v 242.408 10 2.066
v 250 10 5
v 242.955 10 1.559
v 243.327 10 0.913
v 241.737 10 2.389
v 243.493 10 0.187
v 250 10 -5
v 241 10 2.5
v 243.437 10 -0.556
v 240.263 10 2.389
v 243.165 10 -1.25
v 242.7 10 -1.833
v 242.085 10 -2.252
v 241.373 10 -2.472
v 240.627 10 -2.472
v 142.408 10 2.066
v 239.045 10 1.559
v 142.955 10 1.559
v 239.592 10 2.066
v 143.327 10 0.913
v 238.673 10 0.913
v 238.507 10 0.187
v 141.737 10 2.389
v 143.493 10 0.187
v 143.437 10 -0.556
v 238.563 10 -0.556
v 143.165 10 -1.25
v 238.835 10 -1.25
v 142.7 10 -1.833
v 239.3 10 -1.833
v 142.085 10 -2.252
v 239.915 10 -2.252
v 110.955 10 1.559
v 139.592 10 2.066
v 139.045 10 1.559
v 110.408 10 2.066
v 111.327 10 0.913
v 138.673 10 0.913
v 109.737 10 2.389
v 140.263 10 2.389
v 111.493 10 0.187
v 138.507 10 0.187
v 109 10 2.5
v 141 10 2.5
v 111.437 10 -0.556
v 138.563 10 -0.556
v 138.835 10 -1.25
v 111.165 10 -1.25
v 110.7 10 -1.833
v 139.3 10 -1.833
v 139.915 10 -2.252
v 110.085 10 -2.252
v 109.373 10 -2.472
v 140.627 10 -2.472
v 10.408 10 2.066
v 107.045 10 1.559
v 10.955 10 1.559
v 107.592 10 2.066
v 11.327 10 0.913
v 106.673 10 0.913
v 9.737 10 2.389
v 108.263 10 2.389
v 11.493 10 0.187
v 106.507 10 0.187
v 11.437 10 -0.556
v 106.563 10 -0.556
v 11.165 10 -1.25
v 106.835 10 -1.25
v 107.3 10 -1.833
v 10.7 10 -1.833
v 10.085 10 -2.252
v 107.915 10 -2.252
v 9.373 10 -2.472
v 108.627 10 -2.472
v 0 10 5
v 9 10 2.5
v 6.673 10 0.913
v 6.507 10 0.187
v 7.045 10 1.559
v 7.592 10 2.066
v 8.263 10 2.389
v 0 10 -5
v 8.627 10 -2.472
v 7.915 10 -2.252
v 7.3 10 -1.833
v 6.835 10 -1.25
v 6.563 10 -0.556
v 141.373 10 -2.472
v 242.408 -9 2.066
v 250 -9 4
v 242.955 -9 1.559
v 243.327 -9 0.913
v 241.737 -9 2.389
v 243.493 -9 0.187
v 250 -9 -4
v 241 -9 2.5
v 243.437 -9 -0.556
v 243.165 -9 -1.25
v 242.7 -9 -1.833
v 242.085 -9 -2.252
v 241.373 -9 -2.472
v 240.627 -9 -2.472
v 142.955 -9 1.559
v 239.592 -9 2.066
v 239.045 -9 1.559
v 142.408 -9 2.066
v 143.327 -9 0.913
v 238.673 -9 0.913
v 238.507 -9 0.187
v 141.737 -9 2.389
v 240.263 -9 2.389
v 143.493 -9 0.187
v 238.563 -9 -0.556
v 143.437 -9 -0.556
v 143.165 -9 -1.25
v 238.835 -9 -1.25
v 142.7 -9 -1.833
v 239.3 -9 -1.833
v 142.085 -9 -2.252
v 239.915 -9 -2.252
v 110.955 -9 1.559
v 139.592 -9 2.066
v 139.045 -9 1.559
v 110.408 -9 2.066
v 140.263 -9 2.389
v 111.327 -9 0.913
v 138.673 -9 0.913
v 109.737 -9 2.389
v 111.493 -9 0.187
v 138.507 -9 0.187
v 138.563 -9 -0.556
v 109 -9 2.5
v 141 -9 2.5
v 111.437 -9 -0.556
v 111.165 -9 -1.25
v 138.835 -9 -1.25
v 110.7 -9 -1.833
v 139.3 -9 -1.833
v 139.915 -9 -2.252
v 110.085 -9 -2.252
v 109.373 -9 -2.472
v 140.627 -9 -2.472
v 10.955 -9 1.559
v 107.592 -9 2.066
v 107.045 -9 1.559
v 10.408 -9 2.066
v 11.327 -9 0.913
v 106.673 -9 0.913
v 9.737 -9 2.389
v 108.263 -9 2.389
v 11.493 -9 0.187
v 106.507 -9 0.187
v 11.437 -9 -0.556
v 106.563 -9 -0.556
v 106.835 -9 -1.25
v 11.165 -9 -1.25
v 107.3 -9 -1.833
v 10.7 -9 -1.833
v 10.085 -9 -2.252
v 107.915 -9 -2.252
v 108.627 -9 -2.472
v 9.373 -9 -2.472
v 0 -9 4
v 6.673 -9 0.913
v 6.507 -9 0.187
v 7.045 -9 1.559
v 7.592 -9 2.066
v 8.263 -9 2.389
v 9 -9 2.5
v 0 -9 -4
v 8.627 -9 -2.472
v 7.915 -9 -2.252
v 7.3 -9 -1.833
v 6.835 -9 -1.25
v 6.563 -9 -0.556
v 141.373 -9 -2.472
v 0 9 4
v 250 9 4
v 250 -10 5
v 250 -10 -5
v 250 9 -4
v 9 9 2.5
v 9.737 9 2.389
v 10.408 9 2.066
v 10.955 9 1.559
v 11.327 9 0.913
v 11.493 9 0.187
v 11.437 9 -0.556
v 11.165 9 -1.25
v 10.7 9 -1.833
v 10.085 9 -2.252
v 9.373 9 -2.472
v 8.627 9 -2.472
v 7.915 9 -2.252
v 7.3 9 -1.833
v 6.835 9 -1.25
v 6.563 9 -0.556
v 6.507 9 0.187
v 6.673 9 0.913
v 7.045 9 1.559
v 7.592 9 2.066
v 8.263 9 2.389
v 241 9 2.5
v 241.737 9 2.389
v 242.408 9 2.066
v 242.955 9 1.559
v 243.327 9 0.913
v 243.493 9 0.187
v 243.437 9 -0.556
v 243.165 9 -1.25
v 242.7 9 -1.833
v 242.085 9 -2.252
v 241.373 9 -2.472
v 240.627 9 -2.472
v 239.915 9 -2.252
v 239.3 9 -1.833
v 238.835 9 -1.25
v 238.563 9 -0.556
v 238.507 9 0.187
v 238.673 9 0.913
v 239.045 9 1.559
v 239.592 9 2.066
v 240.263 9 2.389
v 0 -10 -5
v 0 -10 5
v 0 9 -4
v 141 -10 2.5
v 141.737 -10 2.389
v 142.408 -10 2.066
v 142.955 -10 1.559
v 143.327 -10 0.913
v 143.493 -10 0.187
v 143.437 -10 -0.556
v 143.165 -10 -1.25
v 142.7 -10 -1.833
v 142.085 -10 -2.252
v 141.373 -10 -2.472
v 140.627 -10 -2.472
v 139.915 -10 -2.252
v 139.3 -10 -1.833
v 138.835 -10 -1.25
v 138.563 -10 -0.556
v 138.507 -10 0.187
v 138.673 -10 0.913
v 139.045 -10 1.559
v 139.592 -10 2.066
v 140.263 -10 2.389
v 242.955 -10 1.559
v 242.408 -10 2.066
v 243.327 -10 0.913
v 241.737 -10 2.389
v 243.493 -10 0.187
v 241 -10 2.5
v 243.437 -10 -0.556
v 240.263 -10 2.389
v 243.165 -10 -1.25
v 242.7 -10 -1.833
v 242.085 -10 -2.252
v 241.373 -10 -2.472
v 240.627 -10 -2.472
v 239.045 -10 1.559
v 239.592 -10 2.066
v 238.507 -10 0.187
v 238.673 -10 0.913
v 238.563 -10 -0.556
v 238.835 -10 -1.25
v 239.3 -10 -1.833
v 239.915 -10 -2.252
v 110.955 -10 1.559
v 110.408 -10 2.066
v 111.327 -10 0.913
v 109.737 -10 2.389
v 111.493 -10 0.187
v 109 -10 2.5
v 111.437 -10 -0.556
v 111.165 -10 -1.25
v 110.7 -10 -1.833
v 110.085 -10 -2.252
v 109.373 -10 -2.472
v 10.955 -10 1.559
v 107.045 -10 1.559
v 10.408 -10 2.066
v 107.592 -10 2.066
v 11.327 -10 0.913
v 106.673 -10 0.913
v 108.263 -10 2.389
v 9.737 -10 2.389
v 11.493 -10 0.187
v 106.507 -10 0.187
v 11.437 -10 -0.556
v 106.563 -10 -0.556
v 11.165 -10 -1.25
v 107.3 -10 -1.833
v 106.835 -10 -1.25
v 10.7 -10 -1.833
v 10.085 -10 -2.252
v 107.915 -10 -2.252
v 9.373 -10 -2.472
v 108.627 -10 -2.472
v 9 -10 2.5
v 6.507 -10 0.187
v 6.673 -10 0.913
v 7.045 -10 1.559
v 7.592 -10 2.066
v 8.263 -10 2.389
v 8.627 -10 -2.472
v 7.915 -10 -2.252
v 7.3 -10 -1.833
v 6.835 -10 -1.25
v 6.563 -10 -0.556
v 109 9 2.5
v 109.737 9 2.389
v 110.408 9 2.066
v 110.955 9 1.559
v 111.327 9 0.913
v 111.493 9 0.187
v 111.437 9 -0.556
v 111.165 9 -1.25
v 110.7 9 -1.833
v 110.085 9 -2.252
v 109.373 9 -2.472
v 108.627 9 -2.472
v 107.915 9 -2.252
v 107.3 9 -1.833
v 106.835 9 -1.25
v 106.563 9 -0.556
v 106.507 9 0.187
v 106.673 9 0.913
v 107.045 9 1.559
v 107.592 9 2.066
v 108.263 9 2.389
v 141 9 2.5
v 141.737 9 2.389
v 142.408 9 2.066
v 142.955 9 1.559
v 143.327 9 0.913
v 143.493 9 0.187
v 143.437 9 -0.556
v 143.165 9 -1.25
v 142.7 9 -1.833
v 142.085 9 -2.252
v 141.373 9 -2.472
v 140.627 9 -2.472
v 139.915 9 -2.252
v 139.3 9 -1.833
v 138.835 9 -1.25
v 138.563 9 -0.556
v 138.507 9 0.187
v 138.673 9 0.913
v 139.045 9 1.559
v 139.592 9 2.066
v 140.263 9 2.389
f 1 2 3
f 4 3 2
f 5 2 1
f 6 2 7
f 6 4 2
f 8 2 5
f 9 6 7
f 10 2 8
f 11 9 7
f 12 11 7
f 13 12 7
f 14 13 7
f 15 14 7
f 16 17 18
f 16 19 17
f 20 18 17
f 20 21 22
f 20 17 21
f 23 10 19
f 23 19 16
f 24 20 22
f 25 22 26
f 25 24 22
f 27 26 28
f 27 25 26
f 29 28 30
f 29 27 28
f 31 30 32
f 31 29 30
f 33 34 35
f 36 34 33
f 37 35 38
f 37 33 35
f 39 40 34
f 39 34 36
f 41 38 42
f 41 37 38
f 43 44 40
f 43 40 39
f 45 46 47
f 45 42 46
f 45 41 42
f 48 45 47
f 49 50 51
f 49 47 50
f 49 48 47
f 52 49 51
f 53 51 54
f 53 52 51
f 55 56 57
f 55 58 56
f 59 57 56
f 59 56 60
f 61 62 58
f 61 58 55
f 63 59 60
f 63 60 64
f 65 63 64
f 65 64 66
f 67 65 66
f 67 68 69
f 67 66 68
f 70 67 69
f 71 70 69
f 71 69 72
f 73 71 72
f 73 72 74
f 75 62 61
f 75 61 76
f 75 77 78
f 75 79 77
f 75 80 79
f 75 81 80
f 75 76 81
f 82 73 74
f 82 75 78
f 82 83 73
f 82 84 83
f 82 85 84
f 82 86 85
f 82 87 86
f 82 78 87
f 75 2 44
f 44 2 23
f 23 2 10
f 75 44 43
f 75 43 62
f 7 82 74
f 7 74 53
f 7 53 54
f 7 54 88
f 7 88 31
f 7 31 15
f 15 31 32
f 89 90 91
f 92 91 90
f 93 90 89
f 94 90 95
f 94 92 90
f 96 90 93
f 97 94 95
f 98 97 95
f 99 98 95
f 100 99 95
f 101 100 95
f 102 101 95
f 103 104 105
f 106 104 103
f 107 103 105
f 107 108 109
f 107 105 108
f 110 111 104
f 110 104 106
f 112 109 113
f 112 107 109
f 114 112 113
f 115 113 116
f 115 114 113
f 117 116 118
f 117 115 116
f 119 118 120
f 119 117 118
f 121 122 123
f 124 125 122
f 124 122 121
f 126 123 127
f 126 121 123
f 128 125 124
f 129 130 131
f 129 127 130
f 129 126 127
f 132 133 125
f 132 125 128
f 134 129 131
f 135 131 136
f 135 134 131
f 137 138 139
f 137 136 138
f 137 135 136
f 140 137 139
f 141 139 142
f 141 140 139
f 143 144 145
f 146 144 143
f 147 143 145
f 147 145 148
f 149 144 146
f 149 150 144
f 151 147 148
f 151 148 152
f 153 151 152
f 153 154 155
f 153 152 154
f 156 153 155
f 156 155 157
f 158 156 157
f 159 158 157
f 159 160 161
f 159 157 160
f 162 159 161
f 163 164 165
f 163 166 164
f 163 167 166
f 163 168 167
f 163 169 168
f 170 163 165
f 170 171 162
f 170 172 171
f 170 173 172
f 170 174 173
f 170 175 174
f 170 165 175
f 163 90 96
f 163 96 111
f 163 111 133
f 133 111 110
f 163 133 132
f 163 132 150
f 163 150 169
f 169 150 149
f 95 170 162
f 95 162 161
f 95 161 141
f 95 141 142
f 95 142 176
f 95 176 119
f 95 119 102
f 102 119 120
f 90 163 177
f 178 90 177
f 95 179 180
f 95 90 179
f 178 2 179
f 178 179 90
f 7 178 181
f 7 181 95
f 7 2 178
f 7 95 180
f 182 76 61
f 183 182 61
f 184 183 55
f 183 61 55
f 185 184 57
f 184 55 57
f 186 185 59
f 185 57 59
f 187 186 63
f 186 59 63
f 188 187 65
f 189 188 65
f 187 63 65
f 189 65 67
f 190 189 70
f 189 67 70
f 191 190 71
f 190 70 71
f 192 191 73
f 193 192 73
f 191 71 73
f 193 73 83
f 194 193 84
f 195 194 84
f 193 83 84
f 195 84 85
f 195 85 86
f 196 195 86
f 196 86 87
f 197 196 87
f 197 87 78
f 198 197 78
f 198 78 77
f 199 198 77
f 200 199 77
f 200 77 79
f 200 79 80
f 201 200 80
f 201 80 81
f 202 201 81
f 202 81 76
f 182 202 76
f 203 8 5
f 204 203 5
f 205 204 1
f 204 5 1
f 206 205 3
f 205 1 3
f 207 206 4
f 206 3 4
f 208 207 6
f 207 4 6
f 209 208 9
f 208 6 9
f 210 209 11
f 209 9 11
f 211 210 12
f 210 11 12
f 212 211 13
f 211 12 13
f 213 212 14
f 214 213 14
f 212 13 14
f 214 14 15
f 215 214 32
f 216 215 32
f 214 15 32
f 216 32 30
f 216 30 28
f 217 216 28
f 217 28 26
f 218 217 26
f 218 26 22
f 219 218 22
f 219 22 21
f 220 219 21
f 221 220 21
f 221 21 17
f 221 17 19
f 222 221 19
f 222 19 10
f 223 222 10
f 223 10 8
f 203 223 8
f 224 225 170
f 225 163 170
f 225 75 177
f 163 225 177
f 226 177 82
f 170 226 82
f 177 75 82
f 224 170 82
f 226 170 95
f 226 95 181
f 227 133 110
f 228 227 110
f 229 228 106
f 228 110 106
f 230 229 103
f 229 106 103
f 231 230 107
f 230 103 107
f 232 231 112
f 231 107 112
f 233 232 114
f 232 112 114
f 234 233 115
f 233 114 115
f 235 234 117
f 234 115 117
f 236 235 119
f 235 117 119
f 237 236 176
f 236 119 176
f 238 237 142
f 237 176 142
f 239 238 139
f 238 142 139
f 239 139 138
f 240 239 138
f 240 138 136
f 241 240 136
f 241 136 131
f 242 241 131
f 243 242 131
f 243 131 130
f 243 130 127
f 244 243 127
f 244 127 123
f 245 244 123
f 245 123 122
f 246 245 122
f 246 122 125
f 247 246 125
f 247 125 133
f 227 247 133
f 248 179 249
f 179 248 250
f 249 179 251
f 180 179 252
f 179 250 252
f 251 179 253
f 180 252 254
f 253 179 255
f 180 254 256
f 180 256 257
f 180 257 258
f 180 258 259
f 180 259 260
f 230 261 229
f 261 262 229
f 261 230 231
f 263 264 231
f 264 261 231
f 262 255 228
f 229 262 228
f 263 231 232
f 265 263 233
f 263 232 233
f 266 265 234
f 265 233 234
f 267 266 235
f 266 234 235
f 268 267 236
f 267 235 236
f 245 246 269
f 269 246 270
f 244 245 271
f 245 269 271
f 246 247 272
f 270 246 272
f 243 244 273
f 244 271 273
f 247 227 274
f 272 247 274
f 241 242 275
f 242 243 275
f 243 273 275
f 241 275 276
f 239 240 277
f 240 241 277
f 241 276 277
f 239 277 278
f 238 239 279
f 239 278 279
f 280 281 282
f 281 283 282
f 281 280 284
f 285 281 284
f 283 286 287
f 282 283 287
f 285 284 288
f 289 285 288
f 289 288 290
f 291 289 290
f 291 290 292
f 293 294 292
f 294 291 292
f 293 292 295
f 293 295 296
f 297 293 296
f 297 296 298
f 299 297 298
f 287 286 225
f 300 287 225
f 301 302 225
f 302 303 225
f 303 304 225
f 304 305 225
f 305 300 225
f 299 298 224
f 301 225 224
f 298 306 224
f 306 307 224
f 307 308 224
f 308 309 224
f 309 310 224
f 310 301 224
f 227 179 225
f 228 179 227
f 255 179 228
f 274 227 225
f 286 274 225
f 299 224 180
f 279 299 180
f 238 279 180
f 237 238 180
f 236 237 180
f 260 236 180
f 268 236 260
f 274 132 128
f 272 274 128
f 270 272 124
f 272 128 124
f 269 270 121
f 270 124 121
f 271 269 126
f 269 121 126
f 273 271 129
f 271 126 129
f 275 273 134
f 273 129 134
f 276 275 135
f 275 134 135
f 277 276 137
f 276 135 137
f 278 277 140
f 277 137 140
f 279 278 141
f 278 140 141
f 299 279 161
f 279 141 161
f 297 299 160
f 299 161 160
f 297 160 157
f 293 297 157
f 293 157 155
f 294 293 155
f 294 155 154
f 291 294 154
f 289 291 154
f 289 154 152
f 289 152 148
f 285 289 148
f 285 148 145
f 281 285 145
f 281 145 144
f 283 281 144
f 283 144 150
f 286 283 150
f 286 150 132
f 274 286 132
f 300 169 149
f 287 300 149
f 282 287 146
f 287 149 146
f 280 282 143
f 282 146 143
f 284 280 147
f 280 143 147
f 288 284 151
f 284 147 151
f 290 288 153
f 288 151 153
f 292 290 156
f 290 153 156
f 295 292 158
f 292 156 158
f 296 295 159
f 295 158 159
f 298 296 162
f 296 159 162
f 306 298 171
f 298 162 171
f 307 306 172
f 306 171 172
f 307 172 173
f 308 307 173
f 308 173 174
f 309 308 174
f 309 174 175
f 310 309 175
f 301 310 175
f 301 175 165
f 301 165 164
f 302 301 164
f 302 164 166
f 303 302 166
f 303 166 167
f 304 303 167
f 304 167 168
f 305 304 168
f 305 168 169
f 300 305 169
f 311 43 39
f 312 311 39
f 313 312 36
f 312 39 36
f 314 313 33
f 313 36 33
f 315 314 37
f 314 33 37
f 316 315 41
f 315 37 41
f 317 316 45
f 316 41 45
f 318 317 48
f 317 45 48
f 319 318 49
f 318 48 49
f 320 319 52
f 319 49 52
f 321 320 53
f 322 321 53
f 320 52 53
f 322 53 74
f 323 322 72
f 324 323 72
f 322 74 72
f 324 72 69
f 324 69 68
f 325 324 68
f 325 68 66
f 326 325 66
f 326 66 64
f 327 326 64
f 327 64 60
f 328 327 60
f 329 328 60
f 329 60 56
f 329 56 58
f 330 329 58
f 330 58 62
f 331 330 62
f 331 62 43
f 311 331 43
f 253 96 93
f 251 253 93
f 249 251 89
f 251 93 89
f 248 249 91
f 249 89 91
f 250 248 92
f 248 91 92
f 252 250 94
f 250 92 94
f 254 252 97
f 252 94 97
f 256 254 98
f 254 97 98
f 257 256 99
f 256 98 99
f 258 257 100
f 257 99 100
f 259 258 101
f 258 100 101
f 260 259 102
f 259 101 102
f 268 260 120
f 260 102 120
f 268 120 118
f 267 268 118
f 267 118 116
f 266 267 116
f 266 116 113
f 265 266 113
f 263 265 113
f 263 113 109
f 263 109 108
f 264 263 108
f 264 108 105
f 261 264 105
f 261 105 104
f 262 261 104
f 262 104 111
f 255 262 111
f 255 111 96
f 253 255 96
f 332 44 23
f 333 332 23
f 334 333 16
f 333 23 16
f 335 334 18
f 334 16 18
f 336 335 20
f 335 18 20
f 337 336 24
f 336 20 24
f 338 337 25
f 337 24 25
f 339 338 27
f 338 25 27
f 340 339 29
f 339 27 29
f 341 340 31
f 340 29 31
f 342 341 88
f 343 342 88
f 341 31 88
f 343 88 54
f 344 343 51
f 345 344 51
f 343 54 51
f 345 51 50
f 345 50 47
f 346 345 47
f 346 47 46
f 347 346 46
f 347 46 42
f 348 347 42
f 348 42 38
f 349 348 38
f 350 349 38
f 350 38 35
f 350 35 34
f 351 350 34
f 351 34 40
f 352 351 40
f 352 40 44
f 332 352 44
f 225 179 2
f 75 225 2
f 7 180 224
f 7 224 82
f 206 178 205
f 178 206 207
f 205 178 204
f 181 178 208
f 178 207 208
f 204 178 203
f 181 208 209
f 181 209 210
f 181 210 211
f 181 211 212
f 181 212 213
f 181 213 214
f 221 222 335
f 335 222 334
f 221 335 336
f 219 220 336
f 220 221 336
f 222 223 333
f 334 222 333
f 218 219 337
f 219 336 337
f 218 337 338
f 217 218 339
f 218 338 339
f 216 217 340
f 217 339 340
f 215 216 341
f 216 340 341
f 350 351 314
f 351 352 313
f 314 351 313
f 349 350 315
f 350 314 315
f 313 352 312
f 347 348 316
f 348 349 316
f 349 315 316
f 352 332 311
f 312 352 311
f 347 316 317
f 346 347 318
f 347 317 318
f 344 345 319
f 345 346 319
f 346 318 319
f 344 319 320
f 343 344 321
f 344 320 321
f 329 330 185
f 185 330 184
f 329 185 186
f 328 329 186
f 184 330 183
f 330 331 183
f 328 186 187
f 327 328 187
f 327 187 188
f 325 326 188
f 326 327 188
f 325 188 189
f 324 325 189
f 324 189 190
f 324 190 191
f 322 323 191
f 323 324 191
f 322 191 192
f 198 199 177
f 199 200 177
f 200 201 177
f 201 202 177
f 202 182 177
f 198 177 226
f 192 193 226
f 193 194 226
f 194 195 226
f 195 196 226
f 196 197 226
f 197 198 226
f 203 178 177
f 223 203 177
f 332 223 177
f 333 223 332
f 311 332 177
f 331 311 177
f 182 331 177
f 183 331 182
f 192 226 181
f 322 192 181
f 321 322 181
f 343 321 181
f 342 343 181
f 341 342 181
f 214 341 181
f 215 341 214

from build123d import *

# Parameters (mm, degrees)
SKETCH1_W           = 10
SKETCH1_H           = 20
SKETCH1_W_2         = 8
SKETCH1_H_2         = 18
BOSS_EXTRUDE1_DEPTH = 250
SKETCH2_R           = 2.5
CUT_EXTRUDE1_DEPTH  = 20
SKETCH3_R           = 2.5
CUT_EXTRUDE2_DEPTH  = 20


with BuildPart() as part:
    # Sketch1 → Boss-Extrude1 (new body)
    with BuildSketch(Plane(origin=(0, 0, 0), x_dir=(0, 0, -1), z_dir=(1, 0, 0))):
        Rectangle(SKETCH1_W, SKETCH1_H)
        Rectangle(SKETCH1_W_2, SKETCH1_H_2, mode=Mode.SUBTRACT)
    extrude(amount=BOSS_EXTRUDE1_DEPTH)

    # Sketch2 → Cut-Extrude1 (cut)
    with BuildSketch(Plane(origin=(0, 10, 0), x_dir=(1, 0, 0), z_dir=(0, 1, 0))):
        with Locations(Location((241, 0, 0), (0, 0, 270))):
            Circle(SKETCH2_R)
        with Locations(Location((9, 0, 0), (0, 0, 270))):
            Circle(SKETCH2_R)
    extrude(amount=-CUT_EXTRUDE1_DEPTH, mode=Mode.SUBTRACT)

    # Sketch3 → Cut-Extrude2 (cut)
    with BuildSketch(Plane(origin=(0, 10, 0), x_dir=(1, 0, 0), z_dir=(0, 1, 0))):
        with Locations(Location((109, 0, 0), (0, 0, 270))):
            Circle(SKETCH3_R)
        with Locations(Location((141, 0, 0), (0, 0, 270))):
            Circle(SKETCH3_R)
    extrude(amount=-CUT_EXTRUDE2_DEPTH, mode=Mode.SUBTRACT)


solid = part.part
